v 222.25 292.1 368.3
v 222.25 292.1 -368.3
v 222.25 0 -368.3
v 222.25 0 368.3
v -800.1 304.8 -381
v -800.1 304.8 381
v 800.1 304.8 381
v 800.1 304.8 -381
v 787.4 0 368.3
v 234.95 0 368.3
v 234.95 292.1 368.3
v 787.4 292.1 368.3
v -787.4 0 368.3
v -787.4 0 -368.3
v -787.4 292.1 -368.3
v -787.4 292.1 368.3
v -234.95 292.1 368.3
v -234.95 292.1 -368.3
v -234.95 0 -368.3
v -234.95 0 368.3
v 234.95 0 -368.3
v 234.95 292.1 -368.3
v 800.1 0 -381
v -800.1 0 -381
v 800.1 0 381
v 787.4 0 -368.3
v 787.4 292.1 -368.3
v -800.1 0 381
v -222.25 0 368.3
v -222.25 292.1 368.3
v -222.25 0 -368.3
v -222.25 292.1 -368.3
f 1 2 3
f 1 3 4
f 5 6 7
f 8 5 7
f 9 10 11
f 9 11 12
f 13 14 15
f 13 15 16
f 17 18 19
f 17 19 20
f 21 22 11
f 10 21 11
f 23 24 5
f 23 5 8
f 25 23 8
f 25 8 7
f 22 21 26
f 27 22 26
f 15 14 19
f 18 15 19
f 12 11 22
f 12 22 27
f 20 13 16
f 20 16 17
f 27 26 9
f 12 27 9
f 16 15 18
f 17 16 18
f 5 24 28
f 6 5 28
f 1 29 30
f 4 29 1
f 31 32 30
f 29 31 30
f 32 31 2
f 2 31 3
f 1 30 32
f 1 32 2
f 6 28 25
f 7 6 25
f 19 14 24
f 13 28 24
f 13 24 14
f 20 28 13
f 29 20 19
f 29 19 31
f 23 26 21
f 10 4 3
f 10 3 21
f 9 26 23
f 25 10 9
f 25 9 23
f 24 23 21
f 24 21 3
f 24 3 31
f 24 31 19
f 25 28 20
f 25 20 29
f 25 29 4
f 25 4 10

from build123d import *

# Parameters (mm, degrees)
F0_W     = 1600.2
F0_H     = 762
F1_DEPTH = 304.8
F2_T     = -12.7
F3_W     = 12.7
F3_H     = 736.6
F4_DEPTH = 292.1


with BuildPart() as f1:
    # F0 (on Front) → F1 (new body)
    with BuildSketch(Plane.XZ):
        Rectangle(F0_W, F0_H)
    extrude(amount=-F1_DEPTH)

    # F2
    f2_openings = [f1.faces().sort_by_distance(p)[0] for p in [
        (0, 0, 0),
    ]]
    offset(amount=F2_T, openings=f2_openings)

    # F3 (on face) → F4 (join)
    with BuildSketch(Plane.XZ.offset(-292.1)):
        with Locations((-228.6, 0)):
            Rectangle(F3_W, F3_H)
        with Locations((228.6, 0)):
            Rectangle(F3_W, F3_H)
    extrude(amount=F4_DEPTH)


solid = f1.part
